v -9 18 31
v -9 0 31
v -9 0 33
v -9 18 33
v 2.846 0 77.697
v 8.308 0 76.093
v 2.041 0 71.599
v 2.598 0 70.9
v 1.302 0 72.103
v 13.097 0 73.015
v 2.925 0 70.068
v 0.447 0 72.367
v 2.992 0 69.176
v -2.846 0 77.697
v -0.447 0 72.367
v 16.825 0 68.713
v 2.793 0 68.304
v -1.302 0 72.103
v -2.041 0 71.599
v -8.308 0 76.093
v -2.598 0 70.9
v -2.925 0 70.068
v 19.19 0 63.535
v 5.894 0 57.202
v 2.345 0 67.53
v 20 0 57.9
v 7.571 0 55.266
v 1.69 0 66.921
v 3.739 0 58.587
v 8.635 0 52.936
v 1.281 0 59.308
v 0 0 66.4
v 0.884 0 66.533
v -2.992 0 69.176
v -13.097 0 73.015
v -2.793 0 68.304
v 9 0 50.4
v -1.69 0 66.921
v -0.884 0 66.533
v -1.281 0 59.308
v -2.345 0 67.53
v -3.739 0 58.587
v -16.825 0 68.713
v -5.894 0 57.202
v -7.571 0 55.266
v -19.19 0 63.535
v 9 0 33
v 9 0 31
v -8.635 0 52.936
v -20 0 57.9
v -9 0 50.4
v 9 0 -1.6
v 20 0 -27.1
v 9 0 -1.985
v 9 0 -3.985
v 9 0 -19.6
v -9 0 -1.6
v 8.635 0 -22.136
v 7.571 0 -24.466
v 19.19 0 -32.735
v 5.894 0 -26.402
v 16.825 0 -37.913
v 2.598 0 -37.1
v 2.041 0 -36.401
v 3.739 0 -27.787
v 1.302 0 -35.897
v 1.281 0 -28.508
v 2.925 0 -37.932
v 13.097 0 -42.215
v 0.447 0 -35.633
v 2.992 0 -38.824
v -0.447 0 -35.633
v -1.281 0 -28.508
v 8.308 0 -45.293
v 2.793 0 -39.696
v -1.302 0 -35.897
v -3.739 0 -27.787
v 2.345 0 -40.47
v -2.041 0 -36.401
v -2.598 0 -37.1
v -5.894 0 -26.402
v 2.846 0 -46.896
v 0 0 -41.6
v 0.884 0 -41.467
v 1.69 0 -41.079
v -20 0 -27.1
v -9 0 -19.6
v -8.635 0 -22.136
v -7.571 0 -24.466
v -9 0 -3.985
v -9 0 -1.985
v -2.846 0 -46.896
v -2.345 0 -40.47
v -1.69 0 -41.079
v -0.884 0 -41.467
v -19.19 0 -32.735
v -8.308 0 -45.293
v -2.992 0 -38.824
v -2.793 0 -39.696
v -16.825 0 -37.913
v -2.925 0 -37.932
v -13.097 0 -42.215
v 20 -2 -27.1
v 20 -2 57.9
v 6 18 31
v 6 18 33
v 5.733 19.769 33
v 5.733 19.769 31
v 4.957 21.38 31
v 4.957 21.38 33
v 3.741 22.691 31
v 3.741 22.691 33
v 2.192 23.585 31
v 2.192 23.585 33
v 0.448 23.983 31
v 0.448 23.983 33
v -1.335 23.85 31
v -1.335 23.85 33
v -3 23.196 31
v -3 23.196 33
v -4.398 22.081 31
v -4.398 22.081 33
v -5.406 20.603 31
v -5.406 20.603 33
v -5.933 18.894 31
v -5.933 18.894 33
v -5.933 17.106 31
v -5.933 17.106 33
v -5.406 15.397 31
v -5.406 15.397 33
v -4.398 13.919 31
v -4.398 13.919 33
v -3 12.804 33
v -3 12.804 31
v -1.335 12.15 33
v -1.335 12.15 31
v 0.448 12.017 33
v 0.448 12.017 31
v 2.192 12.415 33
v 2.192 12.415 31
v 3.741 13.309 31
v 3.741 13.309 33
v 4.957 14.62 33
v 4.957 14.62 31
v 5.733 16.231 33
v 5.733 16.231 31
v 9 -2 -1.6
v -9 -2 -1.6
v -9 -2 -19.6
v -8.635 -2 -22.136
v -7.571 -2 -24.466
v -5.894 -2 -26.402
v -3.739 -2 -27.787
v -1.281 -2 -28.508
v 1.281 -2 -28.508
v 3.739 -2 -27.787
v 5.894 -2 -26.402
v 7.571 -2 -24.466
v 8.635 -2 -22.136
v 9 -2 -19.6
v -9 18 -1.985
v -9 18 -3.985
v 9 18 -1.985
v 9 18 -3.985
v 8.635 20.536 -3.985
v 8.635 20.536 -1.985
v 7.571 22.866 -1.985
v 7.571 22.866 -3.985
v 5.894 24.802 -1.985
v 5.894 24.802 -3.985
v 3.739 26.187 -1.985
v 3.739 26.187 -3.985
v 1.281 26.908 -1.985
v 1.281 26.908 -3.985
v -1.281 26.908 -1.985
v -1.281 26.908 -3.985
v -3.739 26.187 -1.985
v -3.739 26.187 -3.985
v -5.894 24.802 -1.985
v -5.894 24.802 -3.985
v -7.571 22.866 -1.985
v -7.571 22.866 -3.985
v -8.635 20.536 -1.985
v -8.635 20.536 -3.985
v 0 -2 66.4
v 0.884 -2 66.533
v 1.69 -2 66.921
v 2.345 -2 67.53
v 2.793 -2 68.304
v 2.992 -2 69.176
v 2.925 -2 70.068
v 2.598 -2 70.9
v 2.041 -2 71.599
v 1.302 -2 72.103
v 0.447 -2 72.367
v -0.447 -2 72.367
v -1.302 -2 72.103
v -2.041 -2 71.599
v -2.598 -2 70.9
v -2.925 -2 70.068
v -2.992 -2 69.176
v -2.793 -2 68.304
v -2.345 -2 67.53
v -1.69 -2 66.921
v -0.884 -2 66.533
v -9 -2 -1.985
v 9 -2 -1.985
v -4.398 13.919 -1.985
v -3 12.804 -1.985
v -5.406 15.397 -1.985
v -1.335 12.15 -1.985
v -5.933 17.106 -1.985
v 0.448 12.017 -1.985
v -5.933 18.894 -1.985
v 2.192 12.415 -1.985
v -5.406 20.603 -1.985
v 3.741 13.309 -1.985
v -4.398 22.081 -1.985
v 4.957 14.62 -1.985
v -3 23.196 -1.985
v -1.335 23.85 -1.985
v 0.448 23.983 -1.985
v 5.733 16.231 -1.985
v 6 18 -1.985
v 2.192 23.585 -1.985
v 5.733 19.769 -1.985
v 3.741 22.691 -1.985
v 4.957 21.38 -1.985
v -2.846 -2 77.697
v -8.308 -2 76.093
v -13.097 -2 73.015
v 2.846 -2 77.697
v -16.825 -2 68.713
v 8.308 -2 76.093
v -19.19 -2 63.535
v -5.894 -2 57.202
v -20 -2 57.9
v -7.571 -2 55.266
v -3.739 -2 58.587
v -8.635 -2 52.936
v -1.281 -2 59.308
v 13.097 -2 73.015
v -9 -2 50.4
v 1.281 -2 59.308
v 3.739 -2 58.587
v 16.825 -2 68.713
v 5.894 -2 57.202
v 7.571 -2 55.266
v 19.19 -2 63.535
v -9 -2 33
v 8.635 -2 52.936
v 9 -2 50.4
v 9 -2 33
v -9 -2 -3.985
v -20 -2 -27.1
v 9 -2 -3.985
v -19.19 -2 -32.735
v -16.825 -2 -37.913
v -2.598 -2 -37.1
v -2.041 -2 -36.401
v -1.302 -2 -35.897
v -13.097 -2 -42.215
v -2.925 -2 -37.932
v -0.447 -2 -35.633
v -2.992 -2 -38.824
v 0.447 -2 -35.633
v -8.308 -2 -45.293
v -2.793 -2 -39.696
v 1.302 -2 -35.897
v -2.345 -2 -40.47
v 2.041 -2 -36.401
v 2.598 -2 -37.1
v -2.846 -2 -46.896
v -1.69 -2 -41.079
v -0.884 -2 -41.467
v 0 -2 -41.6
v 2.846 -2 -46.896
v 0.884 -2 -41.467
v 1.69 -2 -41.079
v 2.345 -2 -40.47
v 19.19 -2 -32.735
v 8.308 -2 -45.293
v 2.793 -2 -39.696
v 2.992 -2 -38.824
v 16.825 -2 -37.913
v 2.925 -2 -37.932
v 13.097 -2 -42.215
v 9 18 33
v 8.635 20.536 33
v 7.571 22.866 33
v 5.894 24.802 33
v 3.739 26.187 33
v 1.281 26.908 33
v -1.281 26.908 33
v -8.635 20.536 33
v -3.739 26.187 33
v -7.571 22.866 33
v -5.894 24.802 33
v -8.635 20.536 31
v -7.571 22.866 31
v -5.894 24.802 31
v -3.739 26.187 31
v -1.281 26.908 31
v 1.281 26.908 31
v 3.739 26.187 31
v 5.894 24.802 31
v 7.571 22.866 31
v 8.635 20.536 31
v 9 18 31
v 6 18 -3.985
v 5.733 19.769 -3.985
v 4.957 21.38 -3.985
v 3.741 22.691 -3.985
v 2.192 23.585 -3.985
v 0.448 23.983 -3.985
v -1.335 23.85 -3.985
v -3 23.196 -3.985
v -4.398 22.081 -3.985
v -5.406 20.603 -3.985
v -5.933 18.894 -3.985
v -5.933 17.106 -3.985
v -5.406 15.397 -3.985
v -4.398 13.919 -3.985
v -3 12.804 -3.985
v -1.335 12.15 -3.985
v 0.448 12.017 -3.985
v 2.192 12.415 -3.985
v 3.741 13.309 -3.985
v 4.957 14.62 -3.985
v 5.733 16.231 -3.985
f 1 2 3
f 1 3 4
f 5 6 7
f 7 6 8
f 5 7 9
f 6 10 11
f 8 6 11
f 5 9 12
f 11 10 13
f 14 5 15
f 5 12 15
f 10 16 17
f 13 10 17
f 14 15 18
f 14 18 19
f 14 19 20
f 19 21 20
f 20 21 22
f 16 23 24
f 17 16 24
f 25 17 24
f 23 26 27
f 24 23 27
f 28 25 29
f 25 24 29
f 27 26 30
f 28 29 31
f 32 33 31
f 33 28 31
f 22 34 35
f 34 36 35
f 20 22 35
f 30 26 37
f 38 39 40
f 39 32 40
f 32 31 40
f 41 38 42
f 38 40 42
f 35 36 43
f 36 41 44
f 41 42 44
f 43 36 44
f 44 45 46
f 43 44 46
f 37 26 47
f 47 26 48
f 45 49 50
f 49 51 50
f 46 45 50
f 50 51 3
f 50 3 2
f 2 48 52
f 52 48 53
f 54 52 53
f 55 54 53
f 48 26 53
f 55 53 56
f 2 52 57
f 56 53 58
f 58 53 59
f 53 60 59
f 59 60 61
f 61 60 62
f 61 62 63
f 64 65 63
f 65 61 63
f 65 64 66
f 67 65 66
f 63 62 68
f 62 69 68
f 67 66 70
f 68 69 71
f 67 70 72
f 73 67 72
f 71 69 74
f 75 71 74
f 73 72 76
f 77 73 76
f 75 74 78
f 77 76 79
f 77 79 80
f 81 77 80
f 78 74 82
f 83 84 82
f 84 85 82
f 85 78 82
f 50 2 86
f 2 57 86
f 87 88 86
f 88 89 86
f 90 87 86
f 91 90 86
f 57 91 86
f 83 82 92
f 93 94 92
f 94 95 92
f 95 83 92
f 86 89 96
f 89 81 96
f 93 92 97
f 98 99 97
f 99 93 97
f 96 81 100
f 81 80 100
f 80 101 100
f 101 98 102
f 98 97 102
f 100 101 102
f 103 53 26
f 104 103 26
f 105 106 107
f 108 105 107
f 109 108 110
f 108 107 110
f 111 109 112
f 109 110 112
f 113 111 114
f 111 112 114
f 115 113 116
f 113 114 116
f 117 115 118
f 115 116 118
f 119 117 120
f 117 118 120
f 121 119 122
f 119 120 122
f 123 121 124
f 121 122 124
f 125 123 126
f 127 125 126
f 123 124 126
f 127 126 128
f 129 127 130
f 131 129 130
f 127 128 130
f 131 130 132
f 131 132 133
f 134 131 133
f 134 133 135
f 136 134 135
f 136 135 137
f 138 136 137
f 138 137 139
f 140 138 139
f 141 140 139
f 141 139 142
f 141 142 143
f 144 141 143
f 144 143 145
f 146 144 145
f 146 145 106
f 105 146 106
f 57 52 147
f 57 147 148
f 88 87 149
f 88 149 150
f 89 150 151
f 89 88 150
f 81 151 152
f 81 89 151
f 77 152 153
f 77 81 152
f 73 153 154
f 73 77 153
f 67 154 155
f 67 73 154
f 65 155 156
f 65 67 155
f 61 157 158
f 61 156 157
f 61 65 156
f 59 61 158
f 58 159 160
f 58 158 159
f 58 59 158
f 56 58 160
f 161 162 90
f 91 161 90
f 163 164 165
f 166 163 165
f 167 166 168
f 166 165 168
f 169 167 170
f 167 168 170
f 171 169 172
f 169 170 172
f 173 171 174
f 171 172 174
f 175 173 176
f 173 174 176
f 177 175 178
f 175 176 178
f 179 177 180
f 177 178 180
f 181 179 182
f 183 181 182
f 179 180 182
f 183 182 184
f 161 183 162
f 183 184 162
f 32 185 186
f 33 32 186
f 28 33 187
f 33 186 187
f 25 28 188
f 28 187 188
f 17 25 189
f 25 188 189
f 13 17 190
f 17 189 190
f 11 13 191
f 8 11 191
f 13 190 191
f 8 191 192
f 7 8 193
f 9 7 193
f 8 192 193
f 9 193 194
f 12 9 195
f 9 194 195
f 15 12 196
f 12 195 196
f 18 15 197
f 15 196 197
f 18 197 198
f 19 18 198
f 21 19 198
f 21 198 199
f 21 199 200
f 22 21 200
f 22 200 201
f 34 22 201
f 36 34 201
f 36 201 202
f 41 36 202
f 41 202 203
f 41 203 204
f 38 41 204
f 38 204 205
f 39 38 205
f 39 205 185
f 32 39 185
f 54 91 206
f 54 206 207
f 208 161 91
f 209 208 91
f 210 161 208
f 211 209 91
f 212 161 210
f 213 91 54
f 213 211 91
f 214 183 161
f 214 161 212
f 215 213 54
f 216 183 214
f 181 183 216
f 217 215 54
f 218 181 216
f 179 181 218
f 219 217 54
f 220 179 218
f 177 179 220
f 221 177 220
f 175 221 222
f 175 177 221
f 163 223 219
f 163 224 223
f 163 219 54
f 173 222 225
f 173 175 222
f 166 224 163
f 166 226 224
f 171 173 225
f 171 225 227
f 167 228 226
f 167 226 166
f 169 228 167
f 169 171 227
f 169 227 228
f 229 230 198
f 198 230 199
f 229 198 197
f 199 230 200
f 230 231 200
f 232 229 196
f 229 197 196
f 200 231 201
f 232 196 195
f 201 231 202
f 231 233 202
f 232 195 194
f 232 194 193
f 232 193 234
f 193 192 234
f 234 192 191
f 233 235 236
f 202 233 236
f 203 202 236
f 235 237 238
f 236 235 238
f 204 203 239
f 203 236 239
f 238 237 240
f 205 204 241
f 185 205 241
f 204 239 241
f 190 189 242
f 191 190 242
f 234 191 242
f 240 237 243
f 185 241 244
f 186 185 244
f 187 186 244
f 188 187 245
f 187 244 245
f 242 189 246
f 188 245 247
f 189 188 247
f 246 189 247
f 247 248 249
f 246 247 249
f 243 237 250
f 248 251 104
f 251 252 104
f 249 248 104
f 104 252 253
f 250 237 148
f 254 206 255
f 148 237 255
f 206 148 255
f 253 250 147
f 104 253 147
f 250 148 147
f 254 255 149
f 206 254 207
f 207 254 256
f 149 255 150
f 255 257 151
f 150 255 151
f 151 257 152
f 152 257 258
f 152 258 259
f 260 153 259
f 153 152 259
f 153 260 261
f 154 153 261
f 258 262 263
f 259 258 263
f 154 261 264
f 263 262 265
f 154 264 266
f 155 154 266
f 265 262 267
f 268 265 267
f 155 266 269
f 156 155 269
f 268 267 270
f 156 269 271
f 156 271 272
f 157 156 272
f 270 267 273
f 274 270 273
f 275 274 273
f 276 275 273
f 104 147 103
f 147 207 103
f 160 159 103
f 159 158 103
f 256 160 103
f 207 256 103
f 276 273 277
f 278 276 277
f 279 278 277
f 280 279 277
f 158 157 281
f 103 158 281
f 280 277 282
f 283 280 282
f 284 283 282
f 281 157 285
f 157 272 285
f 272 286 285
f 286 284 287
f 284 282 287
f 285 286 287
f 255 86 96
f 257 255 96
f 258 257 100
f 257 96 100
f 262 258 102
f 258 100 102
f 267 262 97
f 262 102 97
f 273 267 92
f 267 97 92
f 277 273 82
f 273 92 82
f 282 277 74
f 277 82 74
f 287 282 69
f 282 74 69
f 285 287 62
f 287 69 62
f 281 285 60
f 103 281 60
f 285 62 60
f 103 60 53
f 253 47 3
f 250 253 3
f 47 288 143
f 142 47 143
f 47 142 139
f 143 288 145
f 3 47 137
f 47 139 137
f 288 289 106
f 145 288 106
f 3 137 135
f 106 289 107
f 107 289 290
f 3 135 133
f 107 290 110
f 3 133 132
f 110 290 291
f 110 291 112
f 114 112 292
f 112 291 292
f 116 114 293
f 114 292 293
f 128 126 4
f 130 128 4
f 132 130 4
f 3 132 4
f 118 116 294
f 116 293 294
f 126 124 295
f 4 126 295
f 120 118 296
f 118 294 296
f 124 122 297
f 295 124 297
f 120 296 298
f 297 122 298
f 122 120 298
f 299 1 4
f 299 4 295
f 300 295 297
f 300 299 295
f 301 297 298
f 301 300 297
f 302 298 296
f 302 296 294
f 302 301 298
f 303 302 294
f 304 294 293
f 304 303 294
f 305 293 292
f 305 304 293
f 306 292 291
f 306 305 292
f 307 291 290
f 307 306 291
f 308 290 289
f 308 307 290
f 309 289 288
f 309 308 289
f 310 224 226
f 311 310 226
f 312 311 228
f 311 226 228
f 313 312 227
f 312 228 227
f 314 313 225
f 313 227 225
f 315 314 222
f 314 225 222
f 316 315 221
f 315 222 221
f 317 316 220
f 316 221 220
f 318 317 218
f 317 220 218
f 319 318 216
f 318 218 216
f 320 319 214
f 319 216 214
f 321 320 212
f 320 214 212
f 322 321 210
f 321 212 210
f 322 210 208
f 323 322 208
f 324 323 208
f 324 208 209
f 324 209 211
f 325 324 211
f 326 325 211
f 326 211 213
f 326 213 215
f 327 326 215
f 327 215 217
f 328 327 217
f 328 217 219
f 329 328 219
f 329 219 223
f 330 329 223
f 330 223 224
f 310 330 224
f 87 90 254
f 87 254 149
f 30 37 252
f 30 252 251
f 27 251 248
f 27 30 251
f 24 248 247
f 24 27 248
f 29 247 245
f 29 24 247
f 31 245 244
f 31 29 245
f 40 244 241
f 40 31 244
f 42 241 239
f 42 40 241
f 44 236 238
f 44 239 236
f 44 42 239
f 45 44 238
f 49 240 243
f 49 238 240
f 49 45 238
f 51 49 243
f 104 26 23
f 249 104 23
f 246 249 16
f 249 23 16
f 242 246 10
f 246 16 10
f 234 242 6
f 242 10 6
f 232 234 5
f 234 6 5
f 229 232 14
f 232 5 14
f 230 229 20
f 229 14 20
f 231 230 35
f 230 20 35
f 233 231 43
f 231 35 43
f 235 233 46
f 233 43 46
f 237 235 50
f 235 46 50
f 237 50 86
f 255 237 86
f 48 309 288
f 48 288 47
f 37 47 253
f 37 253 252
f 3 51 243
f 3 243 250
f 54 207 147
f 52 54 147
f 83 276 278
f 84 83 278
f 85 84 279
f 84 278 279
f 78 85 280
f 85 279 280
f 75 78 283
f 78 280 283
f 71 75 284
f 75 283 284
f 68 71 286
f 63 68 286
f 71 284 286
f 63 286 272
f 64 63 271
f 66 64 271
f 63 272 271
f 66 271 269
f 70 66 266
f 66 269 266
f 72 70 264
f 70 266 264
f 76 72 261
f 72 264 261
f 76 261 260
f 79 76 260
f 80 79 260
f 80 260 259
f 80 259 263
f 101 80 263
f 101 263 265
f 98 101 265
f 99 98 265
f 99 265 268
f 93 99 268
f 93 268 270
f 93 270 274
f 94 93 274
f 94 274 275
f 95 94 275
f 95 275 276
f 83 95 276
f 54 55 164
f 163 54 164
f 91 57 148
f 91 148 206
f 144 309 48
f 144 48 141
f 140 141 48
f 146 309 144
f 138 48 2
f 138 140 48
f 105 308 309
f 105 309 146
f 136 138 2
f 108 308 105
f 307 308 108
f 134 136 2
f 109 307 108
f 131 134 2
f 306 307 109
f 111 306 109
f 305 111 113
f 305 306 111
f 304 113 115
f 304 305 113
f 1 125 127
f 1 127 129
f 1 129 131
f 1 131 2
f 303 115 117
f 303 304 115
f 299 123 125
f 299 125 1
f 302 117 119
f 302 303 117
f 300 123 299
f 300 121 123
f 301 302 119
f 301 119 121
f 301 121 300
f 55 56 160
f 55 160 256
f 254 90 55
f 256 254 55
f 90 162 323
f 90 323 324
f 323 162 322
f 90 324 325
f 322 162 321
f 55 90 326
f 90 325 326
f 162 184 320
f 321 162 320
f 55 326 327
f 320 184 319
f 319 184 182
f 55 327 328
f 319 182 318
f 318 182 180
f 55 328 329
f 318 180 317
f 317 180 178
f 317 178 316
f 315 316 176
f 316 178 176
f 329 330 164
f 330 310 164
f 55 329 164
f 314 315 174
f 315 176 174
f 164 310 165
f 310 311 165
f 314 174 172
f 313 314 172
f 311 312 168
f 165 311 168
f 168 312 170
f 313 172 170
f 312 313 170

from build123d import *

# Parameters (mm, degrees)
BASE_FLANGE1_DEPTH  = 2
CUT_EXTRUDE13_DEPTH = 10
BOSS_EXTRUDE4_DEPTH = 2
BOSS_EXTRUDE5_START = -2
BOSS_EXTRUDE5_DEPTH = 2
SKETCH18_R          = 6
CUT_EXTRUDE14_DEPTH = 87.861941803
SKETCH19_R          = 3
CUT_EXTRUDE15_DEPTH = 86.495161894


# Sheet-metal steps are written as plain solids
with BuildPart() as part:
    # Sketch2 → Base-Flange1 (new body)
    with BuildSketch(Plane(origin=(0, 0, 0), x_dir=(1, 0, 0), z_dir=(0, 1, 0))):
        with BuildLine():
            Line((20, 27.099918438), (20, -57.900081562))
            ThreePointArc((20, -57.900081562), (0, -77.900081562), (-20, -57.900081562))
            Line((-20, -57.900081562), (-20, 27.099918438))
            ThreePointArc((-20, 27.099918438), (0, 47.099918438), (20, 27.099918438))
        make_face()
    extrude(amount=-BASE_FLANGE1_DEPTH)

    # Sketch9 → Cut-Extrude13 (cut)
    with BuildSketch(Plane(origin=(0, 0, 0), x_dir=(1, 0, 0), z_dir=(0, 1, 0))):
        with BuildLine():
            Line((9, 1.599918438), (-9, 1.599918438))
            Line((-9, 1.599918438), (-9, 19.599918438))
            ThreePointArc((-9, 19.599918438), (0, 28.599918438), (9, 19.599918438))
            Line((9, 19.599918438), (9, 1.599918438))
        make_face()
        with BuildLine():
            Line((-9, -32.400081562), (9, -32.400081562))
            Line((9, -32.400081562), (9, -50.400081562))
            ThreePointArc((9, -50.400081562), (0, -59.400081562), (-9, -50.400081562))
            Line((-9, -50.400081562), (-9, -32.400081562))
        make_face()
    extrude(amount=-CUT_EXTRUDE13_DEPTH, mode=Mode.SUBTRACT)

    # Sketch16 → Boss-Extrude4 (add)
    with BuildSketch(Plane.XY.offset(31)):
        with BuildLine():
            Line((-9, -2), (-9, 18))
            ThreePointArc((-9, 18), (0, 27), (9, 18))
            Line((9, 18), (9, -2))
            Line((9, -2), (-9, -2))
        make_face()
    extrude(amount=BOSS_EXTRUDE4_DEPTH)

    # Sketch17 → Boss-Extrude5 (add)
    with BuildSketch(Plane.XY.offset(-1.985).offset(BOSS_EXTRUDE5_START)):
        with BuildLine():
            Line((9, -2), (9, 18))
            ThreePointArc((9, 18), (0, 27), (-9, 18))
            Line((-9, 18), (-9, -2))
            Line((-9, -2), (9, -2))
        make_face()
    extrude(amount=BOSS_EXTRUDE5_DEPTH)

    # Sketch18 → Cut-Extrude14 (cut, through all)
    with BuildSketch(Plane.XY.offset(33)):
        with Locations((0, 18)):
            Circle(SKETCH18_R)
    extrude(amount=-CUT_EXTRUDE14_DEPTH, mode=Mode.SUBTRACT)

    # Sketch19 → Cut-Extrude15 (cut, through all)
    with BuildSketch(Plane.XZ.offset(2)):
        with Locations(Location((0, 69.400081562, 0), (0, 0, 270))):
            Circle(SKETCH19_R)
        with Locations(Location((0, -38.599918438, 0), (0, 0, 270))):
            Circle(SKETCH19_R)
    extrude(amount=-CUT_EXTRUDE15_DEPTH, mode=Mode.SUBTRACT)


solid = part.part
